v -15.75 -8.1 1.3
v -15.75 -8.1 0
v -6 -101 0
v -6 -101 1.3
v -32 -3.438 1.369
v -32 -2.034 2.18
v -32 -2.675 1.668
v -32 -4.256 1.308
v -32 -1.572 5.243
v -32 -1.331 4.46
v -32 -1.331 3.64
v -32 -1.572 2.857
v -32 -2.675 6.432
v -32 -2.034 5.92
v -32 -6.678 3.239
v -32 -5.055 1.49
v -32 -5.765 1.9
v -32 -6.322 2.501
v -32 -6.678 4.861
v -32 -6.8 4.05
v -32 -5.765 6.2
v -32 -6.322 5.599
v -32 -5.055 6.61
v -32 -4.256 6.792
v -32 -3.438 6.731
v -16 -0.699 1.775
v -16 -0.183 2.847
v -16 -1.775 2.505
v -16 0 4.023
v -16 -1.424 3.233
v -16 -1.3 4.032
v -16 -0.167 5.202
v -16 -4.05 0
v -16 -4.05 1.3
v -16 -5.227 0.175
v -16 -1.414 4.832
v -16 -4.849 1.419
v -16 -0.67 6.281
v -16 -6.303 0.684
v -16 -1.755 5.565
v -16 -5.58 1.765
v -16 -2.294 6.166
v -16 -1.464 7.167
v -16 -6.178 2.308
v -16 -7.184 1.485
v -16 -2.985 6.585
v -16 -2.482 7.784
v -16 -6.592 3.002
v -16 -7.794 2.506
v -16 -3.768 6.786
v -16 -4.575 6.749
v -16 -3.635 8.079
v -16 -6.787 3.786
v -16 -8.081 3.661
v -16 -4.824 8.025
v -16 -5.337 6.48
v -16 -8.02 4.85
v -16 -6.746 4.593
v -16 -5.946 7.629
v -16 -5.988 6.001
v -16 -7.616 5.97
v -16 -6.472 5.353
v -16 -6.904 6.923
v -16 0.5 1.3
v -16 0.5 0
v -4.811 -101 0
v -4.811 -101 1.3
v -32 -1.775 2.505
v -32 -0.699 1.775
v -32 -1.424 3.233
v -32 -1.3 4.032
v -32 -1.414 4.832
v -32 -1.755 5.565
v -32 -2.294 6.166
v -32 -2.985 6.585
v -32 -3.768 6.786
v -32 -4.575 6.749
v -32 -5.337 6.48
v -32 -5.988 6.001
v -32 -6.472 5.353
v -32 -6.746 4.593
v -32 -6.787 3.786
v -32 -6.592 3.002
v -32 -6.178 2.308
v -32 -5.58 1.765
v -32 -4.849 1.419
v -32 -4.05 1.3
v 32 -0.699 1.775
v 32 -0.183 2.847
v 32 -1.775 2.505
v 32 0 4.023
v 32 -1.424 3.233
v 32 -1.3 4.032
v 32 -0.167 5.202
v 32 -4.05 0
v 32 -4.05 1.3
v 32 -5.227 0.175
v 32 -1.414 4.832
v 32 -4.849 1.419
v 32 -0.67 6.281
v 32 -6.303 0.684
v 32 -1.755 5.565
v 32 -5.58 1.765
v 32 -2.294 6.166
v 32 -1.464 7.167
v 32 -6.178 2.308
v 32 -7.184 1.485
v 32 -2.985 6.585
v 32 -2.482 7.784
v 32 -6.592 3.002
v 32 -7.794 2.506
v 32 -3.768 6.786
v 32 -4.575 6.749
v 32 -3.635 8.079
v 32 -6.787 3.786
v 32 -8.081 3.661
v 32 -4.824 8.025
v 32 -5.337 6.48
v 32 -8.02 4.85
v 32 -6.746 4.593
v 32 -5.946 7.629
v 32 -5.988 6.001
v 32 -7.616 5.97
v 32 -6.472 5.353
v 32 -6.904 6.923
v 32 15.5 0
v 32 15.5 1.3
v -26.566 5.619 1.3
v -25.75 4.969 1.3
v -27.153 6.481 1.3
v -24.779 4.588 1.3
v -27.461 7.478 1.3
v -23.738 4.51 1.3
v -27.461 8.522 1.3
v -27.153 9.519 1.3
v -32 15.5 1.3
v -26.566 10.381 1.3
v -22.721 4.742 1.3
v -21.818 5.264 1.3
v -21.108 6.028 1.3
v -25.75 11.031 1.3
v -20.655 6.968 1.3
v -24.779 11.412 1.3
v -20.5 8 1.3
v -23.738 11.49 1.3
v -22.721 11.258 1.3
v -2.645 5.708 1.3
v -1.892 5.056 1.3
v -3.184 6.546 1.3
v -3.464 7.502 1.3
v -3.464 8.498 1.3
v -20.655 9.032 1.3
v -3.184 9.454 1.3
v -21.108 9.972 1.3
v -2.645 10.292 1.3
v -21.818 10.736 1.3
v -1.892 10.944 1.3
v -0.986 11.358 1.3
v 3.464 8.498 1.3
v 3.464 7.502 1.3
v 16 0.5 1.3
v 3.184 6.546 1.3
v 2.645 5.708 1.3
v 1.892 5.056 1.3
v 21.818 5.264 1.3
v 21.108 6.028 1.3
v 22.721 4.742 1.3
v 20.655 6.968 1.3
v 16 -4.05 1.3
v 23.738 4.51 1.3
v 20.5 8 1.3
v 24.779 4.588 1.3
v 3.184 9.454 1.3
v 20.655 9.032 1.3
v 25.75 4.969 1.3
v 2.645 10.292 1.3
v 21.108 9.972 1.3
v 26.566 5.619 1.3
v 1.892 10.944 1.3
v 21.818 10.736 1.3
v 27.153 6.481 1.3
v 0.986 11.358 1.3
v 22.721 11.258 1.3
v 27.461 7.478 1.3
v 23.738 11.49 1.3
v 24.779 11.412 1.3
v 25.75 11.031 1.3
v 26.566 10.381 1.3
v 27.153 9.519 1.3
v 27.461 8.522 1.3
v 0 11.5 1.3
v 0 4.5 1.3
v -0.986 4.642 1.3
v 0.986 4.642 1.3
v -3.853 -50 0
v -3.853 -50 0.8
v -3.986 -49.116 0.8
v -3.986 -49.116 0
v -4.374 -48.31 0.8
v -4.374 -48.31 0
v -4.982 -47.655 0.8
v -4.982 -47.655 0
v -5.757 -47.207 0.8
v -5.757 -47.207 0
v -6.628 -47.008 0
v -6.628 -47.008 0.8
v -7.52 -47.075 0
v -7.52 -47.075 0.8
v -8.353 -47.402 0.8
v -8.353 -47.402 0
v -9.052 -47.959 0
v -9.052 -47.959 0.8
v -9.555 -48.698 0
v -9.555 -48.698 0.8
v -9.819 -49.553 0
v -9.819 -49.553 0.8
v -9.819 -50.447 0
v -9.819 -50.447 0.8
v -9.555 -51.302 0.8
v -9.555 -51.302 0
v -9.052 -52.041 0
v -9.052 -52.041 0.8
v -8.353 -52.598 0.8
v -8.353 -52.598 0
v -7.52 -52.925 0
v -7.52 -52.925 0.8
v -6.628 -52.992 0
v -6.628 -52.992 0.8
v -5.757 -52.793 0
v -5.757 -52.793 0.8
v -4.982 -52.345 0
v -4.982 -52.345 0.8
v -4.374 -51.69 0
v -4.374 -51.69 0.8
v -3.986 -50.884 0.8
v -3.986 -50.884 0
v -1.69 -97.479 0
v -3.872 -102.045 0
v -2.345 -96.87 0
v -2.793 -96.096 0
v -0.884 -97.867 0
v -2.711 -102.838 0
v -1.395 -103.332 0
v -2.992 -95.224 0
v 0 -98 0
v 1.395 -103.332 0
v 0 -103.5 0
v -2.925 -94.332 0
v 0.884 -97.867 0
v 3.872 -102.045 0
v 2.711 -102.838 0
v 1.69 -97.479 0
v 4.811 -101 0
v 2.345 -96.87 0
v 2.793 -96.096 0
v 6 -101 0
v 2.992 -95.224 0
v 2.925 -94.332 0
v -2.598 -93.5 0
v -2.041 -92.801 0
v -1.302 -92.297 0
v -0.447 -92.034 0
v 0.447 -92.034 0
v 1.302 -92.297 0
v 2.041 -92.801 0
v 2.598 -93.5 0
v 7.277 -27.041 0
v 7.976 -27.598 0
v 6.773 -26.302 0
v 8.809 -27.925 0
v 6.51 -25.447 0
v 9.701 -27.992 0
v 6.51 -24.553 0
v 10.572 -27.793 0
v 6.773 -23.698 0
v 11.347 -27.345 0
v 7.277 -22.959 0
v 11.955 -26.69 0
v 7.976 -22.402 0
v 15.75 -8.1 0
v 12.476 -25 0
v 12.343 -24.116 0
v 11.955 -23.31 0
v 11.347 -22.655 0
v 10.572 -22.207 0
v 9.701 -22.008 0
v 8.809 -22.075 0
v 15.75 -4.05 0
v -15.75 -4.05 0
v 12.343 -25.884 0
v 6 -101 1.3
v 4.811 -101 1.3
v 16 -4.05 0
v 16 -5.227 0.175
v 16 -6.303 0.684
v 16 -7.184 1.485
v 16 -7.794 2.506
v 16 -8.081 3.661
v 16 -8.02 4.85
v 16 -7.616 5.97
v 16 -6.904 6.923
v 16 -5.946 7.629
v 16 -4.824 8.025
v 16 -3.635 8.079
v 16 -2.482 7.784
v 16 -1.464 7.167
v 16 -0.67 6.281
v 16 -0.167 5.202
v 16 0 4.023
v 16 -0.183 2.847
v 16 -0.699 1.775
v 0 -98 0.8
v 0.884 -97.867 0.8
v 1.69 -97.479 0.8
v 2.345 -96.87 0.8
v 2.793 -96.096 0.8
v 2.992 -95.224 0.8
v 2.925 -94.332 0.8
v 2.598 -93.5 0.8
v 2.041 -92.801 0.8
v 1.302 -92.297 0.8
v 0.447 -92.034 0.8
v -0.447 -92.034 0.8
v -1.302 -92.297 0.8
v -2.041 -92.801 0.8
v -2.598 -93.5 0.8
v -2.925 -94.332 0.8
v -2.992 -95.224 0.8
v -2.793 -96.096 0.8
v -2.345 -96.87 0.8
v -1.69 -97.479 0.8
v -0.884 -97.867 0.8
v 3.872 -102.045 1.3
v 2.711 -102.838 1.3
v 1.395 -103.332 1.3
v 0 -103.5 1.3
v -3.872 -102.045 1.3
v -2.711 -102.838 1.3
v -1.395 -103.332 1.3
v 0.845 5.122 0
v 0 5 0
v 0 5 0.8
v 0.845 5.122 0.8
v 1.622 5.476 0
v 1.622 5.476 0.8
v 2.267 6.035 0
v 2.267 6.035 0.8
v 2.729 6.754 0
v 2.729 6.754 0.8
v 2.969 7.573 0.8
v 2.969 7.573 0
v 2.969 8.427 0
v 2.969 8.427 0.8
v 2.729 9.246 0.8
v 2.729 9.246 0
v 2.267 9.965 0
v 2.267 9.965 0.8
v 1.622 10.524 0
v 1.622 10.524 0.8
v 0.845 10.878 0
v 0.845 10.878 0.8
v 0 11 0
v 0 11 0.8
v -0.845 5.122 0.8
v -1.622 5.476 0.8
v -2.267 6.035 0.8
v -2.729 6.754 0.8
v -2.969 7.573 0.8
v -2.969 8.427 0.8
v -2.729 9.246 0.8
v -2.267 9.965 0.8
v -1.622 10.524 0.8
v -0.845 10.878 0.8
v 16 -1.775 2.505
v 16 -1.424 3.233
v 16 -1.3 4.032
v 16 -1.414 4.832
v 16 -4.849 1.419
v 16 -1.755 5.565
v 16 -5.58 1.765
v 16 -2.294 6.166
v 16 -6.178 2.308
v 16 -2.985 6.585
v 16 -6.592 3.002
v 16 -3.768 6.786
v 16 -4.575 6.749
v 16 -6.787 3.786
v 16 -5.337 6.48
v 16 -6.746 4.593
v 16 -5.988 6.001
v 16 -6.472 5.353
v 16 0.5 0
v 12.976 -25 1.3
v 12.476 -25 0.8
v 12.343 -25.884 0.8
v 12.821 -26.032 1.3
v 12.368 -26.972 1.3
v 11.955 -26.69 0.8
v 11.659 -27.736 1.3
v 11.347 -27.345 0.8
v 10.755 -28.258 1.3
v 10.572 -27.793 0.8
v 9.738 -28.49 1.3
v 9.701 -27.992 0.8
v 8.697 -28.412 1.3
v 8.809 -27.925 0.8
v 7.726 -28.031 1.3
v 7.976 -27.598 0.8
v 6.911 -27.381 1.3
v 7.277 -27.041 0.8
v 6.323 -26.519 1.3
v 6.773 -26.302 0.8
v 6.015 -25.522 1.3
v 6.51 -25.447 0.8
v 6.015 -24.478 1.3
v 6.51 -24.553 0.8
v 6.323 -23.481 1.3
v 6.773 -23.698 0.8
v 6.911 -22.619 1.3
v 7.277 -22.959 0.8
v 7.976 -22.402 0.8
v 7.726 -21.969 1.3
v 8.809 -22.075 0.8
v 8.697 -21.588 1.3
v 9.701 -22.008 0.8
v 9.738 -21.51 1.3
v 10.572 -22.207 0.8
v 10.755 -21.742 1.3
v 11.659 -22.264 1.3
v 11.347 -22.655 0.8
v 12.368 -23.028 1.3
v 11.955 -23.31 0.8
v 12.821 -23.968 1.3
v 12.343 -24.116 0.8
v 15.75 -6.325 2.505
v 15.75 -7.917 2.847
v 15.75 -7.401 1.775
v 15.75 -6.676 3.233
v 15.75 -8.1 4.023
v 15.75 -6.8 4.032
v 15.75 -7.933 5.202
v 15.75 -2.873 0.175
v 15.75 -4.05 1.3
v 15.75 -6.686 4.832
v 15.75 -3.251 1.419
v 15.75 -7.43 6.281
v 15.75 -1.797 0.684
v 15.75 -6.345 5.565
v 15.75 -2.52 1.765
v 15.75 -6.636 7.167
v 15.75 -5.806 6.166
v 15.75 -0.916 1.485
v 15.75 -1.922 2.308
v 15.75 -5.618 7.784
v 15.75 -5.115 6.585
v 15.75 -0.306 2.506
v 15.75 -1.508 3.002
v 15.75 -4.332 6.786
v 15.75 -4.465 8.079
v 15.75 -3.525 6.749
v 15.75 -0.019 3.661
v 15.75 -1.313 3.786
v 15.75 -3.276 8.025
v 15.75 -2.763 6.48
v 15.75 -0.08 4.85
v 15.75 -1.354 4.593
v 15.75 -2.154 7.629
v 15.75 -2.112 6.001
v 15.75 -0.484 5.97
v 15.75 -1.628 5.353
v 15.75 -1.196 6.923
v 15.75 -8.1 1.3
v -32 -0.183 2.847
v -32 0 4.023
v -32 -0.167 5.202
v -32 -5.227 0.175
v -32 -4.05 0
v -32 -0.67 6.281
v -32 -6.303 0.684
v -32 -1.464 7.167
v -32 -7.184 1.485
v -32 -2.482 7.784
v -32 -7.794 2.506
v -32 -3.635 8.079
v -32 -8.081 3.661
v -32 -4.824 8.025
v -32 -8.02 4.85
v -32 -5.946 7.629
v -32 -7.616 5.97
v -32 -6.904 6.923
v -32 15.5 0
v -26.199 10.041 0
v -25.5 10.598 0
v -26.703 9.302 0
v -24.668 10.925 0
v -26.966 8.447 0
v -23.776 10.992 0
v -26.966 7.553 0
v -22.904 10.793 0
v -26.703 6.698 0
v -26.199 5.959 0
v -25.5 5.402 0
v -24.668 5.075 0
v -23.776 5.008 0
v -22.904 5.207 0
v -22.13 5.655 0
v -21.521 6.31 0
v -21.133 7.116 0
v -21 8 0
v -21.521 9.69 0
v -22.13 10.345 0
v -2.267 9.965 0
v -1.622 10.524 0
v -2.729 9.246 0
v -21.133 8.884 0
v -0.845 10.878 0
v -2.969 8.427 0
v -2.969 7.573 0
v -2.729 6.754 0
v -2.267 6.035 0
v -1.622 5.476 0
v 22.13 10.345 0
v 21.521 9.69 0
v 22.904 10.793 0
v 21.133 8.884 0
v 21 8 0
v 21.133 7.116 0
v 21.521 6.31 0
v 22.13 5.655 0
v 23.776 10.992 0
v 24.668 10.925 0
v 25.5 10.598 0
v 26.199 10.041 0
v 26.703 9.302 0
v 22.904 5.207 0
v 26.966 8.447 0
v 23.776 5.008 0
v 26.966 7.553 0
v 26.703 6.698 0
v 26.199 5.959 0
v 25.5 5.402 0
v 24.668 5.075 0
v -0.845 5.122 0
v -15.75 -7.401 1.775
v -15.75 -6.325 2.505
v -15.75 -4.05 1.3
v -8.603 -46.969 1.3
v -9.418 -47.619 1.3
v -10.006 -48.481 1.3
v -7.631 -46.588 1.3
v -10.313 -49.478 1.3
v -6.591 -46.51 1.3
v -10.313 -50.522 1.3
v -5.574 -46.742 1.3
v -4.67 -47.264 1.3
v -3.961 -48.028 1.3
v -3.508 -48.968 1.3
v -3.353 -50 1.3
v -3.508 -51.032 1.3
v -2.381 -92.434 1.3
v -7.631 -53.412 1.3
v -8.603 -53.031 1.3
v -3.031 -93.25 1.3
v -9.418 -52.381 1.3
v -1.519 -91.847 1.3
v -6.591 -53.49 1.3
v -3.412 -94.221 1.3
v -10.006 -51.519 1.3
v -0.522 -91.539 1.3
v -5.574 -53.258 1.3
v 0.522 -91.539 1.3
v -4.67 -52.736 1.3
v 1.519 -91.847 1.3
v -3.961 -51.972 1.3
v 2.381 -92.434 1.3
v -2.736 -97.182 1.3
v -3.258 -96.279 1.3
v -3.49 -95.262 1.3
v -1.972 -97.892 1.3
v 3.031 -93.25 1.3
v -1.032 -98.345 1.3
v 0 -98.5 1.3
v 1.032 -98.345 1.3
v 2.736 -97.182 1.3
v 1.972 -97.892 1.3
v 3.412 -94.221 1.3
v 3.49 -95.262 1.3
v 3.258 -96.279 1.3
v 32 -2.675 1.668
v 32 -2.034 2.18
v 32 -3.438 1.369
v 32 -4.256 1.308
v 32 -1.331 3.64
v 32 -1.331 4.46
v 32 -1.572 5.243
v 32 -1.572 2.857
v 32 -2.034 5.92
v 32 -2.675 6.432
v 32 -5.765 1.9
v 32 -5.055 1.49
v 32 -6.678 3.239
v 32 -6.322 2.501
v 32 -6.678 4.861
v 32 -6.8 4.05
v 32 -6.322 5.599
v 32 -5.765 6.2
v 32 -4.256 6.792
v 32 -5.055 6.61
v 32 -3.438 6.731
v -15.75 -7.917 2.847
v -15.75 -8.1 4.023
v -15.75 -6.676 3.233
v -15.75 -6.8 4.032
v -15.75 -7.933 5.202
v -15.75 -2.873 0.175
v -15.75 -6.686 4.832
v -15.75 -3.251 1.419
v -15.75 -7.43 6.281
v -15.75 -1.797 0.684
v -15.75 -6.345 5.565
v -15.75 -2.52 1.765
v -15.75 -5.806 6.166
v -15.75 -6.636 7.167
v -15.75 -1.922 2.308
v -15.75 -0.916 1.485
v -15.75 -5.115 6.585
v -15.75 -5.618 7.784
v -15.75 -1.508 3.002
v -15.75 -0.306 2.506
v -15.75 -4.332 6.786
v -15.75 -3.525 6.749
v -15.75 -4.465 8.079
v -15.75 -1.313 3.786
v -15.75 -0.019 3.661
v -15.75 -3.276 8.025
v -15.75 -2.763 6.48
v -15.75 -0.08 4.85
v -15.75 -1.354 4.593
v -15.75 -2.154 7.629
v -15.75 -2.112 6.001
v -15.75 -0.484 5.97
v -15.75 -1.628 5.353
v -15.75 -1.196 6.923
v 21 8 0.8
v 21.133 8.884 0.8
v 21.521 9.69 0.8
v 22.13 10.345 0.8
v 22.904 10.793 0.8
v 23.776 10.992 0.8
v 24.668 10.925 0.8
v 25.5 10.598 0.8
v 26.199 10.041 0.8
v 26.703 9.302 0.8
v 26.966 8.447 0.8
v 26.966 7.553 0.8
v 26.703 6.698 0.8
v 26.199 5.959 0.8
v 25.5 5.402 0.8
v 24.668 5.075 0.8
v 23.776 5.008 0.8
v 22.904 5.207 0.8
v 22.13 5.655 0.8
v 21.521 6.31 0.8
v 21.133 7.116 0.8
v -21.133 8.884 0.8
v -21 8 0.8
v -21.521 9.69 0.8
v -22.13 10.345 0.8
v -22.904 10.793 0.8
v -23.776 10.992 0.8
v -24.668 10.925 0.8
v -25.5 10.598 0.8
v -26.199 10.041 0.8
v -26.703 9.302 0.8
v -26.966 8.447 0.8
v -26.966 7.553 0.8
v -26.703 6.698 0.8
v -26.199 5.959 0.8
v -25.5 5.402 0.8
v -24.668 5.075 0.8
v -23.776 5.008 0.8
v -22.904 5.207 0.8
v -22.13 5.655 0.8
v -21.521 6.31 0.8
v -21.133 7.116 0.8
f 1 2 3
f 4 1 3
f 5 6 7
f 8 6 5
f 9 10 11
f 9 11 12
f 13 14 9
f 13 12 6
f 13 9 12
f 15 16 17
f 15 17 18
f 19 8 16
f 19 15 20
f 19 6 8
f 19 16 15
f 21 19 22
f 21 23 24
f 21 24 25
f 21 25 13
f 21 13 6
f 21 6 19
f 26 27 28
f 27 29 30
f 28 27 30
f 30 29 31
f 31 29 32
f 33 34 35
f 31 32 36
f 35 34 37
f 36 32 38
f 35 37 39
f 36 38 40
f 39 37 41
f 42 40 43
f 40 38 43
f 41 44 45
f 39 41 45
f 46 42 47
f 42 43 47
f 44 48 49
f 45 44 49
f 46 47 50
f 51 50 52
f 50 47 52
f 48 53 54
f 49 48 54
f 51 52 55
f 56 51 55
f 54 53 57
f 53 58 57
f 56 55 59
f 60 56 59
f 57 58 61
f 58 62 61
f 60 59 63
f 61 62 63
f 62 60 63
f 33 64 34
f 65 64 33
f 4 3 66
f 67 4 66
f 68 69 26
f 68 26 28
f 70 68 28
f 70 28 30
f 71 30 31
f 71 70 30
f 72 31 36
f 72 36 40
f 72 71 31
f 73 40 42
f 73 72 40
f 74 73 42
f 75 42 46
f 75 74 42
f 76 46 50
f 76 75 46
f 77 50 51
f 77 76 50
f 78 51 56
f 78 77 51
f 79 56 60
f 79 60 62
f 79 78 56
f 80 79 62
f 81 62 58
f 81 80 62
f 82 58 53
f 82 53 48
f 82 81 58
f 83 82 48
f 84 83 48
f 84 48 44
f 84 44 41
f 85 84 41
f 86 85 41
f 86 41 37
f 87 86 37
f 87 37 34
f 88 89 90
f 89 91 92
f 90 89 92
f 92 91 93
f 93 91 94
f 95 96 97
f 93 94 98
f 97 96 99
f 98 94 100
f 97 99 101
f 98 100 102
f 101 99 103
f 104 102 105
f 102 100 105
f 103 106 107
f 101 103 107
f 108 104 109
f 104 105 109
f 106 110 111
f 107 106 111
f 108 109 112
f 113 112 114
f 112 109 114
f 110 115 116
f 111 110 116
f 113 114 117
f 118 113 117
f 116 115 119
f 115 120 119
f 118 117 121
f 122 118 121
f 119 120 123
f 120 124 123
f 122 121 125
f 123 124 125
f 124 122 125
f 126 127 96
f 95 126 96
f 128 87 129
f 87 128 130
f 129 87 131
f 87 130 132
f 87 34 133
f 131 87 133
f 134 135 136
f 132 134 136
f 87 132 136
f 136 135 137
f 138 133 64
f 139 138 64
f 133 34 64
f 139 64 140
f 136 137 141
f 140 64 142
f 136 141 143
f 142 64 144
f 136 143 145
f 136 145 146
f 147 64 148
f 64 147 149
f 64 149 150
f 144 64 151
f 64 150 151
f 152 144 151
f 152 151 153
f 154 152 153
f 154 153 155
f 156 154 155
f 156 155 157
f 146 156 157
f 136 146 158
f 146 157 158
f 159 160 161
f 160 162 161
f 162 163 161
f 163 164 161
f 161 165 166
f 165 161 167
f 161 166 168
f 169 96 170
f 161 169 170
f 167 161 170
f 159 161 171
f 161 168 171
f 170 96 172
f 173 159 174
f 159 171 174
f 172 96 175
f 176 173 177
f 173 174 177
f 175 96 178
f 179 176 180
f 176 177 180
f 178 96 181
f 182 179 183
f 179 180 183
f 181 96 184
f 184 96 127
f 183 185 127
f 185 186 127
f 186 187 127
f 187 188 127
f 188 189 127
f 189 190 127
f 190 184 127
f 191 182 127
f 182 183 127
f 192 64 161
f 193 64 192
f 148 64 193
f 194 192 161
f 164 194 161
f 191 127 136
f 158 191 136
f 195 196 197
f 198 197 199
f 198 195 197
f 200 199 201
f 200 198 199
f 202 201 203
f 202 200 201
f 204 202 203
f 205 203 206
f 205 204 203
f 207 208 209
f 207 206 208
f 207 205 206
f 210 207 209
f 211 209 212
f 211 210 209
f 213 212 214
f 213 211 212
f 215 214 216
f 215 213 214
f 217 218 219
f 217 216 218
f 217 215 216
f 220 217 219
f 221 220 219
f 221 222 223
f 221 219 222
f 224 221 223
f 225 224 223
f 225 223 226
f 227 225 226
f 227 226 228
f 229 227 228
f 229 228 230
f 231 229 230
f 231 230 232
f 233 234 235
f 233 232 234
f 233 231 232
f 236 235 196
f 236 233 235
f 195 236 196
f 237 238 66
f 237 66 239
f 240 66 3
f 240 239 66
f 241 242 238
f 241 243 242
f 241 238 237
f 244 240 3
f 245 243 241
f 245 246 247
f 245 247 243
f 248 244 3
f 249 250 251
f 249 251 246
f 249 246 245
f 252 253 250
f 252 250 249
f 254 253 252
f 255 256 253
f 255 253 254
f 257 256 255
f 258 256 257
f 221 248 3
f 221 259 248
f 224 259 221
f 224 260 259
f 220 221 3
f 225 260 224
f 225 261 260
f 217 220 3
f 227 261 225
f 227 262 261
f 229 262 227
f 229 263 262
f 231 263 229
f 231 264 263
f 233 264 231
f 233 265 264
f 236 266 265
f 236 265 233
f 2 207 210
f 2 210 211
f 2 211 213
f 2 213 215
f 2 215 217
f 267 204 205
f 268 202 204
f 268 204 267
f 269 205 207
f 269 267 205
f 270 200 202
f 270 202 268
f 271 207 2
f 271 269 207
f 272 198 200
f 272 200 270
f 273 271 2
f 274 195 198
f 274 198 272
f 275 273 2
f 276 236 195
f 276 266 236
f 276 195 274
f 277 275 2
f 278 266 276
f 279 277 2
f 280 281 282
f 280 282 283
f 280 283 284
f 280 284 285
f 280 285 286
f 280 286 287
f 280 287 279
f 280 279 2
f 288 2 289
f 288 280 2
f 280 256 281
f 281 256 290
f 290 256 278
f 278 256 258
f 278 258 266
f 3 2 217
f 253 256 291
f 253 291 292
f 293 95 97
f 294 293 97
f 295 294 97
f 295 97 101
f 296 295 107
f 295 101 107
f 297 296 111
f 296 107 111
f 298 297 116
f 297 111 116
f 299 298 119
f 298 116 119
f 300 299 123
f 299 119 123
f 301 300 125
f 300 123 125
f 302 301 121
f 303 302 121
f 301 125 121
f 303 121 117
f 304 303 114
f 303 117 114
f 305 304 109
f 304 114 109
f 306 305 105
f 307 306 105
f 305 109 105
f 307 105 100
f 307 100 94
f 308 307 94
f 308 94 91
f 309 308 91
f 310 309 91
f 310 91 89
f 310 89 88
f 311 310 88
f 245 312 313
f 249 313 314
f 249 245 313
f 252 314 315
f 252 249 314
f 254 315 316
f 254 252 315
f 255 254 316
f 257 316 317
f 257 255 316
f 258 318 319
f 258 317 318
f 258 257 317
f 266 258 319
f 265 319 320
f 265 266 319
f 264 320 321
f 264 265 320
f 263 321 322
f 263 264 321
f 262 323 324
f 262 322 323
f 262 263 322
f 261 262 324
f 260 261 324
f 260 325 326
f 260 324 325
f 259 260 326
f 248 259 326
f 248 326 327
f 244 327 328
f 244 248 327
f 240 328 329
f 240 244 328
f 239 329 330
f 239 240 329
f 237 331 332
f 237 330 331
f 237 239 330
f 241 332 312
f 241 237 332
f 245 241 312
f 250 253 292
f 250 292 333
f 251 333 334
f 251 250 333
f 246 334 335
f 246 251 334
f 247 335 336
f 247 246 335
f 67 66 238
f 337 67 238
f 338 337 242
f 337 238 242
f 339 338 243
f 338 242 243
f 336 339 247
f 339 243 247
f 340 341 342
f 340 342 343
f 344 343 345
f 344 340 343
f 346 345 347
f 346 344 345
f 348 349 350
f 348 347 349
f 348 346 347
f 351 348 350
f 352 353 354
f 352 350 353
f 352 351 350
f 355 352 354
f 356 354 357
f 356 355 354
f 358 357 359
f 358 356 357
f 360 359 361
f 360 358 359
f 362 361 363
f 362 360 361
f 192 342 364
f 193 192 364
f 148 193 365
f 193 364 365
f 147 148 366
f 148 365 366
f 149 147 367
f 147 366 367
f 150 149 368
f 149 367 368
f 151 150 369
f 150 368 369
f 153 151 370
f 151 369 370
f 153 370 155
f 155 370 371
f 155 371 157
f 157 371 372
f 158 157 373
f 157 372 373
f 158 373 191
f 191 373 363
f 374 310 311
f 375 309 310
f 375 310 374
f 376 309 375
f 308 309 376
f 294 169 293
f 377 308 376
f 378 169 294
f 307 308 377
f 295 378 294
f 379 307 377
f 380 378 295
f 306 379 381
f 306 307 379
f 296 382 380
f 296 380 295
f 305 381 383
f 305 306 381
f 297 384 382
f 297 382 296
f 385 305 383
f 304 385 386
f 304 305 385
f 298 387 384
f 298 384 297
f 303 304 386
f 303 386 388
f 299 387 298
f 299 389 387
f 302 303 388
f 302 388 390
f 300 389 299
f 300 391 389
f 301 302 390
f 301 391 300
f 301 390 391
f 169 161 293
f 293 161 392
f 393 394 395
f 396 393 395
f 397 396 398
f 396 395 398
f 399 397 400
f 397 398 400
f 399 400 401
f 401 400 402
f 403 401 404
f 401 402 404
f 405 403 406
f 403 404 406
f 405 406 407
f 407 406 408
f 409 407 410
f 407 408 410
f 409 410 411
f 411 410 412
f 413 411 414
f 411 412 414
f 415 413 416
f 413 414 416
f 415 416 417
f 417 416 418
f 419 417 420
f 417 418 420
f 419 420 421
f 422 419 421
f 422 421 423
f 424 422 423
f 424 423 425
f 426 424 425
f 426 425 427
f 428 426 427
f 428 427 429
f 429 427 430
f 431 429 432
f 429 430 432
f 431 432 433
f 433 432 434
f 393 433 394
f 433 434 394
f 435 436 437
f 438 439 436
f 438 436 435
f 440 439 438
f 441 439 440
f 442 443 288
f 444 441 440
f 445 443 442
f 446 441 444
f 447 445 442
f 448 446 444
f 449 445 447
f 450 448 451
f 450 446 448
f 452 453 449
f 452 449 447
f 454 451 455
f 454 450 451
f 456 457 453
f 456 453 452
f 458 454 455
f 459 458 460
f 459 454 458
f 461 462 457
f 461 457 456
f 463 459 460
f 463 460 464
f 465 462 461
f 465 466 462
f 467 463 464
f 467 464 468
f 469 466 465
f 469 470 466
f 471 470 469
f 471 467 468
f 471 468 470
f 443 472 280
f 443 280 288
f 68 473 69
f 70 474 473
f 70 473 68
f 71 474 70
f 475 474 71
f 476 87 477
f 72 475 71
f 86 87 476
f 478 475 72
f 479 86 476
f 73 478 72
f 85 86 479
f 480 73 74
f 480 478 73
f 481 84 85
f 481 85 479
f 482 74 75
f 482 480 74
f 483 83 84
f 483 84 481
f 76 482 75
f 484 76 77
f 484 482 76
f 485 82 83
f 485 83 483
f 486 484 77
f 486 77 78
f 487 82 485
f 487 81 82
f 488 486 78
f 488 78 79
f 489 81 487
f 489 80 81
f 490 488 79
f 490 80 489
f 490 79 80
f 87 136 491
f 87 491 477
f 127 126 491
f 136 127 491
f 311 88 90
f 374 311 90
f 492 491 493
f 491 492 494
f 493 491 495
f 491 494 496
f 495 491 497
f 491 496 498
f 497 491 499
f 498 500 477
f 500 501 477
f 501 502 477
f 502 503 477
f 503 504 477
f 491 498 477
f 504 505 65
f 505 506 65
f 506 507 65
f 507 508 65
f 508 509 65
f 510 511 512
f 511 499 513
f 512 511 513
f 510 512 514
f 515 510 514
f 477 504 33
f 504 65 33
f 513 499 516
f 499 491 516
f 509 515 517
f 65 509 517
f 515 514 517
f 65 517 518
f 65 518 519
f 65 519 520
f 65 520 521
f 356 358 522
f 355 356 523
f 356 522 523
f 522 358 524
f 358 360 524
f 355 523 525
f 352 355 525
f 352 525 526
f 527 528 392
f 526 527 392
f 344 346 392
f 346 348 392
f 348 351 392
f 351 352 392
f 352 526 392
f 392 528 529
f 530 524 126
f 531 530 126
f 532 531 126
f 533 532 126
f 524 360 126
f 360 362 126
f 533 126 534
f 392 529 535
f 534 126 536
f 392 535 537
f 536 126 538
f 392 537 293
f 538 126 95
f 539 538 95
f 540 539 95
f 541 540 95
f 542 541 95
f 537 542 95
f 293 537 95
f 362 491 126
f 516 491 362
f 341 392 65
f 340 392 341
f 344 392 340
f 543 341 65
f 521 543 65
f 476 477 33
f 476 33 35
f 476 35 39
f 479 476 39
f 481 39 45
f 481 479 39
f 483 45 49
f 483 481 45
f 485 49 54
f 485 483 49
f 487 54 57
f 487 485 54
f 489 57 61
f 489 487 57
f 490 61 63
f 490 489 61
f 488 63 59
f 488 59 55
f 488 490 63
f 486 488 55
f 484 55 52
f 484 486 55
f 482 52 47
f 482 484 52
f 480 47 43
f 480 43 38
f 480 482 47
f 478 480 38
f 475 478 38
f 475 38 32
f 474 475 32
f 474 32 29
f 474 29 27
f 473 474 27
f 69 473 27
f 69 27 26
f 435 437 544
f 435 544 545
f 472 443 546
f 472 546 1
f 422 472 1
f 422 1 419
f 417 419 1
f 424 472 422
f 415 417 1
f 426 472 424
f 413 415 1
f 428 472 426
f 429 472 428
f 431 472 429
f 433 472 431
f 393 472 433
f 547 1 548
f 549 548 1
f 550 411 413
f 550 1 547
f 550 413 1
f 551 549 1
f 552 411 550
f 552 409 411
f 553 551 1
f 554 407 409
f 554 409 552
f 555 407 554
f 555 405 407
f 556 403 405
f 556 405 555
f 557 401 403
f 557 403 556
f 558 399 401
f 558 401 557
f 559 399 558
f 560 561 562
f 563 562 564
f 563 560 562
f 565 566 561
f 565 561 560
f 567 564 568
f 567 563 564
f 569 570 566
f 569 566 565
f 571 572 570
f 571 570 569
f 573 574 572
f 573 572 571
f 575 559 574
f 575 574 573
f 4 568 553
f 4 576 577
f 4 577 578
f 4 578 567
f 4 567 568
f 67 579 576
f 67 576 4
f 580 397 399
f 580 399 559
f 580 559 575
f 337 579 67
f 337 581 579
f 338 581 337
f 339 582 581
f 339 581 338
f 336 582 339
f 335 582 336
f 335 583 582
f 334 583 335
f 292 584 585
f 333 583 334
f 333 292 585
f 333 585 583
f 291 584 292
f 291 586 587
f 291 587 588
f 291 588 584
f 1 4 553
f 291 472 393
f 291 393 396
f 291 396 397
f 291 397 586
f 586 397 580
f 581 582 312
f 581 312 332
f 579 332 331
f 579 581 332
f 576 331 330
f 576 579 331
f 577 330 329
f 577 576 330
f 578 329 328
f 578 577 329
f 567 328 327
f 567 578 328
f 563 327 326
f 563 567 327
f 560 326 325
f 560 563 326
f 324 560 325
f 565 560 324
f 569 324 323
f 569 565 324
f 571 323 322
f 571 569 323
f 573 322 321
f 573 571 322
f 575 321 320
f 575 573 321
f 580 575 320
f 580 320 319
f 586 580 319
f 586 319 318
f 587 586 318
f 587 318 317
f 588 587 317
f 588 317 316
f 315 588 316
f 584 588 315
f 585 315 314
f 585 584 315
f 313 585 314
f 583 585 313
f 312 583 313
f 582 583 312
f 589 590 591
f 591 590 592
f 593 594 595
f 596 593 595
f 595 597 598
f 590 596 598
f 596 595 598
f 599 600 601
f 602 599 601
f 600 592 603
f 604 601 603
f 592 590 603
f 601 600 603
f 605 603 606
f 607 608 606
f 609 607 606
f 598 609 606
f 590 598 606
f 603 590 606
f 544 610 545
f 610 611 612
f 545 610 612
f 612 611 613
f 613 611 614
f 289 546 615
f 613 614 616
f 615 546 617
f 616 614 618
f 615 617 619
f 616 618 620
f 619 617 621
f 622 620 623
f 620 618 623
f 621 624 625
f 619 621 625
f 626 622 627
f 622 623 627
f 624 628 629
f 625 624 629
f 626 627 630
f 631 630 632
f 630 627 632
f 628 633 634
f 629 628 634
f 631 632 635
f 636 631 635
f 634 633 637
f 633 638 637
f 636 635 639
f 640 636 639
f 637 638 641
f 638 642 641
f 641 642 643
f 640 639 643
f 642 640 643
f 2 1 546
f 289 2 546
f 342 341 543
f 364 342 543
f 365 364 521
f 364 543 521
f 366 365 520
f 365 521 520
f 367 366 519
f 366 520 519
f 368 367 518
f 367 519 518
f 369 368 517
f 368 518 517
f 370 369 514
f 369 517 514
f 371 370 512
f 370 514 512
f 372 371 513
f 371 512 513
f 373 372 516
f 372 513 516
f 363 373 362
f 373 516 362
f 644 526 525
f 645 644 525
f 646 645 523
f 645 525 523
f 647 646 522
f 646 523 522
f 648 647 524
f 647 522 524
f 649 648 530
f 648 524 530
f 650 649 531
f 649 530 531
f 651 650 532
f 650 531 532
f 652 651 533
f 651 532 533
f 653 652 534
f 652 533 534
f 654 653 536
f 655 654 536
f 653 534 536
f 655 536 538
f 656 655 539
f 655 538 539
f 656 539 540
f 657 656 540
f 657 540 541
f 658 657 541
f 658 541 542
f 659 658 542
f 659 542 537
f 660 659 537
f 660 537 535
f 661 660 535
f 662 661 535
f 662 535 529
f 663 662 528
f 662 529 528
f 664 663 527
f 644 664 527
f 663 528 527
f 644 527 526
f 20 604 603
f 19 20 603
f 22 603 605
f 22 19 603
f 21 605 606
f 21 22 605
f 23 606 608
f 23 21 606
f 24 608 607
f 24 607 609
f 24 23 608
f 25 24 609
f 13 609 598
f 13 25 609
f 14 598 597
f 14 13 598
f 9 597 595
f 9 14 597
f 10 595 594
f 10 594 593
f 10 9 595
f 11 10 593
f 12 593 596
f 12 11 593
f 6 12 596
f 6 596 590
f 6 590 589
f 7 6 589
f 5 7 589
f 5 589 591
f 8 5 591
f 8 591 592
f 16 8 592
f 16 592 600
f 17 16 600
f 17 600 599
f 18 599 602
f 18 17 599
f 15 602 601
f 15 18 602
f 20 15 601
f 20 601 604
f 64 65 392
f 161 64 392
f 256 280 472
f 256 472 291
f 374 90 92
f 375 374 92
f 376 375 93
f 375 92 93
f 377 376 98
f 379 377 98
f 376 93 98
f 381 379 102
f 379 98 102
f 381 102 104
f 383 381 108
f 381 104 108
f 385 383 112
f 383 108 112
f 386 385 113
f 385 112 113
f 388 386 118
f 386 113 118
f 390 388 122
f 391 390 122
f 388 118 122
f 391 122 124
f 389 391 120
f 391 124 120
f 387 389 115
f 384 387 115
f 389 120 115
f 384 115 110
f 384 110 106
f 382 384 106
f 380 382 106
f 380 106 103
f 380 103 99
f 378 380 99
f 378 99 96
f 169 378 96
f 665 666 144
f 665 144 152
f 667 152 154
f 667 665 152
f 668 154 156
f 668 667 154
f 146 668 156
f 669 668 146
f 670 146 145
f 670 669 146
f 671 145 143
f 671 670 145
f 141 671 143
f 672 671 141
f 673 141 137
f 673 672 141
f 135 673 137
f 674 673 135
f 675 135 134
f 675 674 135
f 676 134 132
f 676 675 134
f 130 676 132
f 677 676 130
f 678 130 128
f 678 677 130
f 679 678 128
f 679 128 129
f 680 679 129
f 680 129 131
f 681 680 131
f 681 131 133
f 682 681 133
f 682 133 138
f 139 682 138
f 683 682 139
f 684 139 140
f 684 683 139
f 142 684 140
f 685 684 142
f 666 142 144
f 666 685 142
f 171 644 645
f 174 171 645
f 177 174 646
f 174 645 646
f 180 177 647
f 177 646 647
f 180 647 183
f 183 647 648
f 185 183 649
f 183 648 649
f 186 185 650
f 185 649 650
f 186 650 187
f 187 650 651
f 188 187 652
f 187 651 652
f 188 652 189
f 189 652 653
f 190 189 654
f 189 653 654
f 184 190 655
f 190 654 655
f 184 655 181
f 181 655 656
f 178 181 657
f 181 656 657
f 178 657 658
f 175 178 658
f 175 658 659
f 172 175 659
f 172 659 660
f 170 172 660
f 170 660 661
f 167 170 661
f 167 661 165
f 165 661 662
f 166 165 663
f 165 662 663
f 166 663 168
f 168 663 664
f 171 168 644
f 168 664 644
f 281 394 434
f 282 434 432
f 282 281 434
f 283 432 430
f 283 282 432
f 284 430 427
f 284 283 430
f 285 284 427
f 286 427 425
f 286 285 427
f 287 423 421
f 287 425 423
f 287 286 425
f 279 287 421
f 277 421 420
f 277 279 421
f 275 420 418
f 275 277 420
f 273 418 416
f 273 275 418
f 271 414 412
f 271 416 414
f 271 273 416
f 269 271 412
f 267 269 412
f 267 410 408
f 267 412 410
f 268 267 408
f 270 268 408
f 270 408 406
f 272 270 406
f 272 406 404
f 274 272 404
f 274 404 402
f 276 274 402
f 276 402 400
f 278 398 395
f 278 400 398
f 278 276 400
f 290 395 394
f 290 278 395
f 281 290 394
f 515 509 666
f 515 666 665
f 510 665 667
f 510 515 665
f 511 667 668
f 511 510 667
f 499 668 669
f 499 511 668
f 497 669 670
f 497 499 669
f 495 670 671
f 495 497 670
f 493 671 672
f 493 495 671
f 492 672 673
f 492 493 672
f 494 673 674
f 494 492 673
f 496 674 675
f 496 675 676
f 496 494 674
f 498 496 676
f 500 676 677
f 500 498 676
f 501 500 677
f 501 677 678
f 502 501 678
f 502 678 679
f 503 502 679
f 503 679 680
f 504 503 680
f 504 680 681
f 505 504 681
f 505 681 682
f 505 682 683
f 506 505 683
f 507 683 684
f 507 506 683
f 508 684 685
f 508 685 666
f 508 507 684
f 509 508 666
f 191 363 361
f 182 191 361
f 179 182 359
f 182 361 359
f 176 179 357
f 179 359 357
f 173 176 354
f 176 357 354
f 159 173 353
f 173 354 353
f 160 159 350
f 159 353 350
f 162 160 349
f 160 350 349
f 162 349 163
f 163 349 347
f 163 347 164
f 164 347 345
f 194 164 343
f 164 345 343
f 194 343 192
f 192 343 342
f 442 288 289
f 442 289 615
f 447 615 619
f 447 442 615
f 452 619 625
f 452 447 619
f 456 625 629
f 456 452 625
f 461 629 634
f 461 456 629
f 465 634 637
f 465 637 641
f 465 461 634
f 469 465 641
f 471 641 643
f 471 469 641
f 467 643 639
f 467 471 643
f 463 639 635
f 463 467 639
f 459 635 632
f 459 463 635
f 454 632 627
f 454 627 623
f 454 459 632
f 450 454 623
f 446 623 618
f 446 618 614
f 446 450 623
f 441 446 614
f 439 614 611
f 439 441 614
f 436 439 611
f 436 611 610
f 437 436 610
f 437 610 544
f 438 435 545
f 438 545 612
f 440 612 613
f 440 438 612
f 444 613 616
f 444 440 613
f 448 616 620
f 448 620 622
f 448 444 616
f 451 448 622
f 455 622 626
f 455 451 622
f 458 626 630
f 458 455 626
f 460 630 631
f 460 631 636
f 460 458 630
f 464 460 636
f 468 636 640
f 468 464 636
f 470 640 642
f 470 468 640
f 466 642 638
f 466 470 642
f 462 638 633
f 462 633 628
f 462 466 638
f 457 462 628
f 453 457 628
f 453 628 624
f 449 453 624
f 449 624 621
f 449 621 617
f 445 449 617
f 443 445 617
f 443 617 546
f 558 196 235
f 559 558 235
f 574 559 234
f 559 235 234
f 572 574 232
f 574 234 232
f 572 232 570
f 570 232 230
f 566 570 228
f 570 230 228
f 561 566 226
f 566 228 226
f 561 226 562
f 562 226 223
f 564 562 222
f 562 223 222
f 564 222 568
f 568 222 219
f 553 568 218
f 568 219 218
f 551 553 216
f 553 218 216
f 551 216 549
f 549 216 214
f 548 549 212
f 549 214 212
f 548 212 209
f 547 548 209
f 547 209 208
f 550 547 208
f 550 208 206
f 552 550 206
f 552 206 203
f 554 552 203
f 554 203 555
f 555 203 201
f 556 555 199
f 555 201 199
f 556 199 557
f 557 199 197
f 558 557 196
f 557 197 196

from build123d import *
from build123d import SkipClean  # not in build123d's __all__

# Parameters (mm, degrees)
F0_R          = 3
F1_DEPTH      = 1.3
F2_DEPTH      = 1.3
F5_DEPTH      = 1.301
F7_DEPTH      = 15.75
F7_DEPTH_BACK = 15.75
F9_DEPTH      = 16
F11_R         = 2.75
F12_DEPTH     = 64
F13_SIZE      = 0.5
F13_2_SIZE    = 0.5


with BuildPart() as f1:
    # F0 (on Top) → F1 (new body)
    with BuildSketch(Plane.XY):
        with BuildLine():
            Line((0, 15.5), (-32, 15.5))
            Line((-32, 15.5), (-32, 0))
            Line((-32, 0), (-16, 0))
            Line((-16, 0), (-16, 0.5))
            Line((-16, 0.5), (0, 0.5))
            Line((0, 0.5), (0, 5))
            ThreePointArc((0, 5), (-3, 8), (0, 11))
            Line((0, 11), (0, 15.5))
        make_face()
        with Locations((-24, 8)):
            Circle(F0_R, mode=Mode.SUBTRACT)
    extrude(amount=F1_DEPTH)

    # F3: F1 across face


with BuildPart() as f2:
    # F0 (on Top) → F2 (new body)
    with BuildSketch(Plane.XY):
        with BuildLine():
            Line((0, -92), (0, -8.1))
            Line((0, -8.1), (-15.75, -8.1))
            Line((-15.75, -8.1), (-6, -101))
            Line((-6, -101), (-4.8112012446, -101))
            ThreePointArc((-4.8112012446, -101), (-2.7109803308, -102.8376972935), (0, -103.5))
            Line((0, -103.5), (0, -98))
            ThreePointArc((0, -98), (-3, -95), (0, -92))
        make_face()
        with Locations((-6.8525296017, -50)):
            Circle(F0_R, mode=Mode.SUBTRACT)
        with Locations((-6.8525296017, -50)):
            Circle(F0_R)
    extrude(amount=F2_DEPTH)

    # F4: F2 across face


with BuildPart() as f1_1:
    add(f1.part, clean=False)
    with SkipClean():  # cleaning this boolean's faces spoils the solid; the shape is the same uncleaned
        add(f1.part.mirror(Plane(origin=(0, -50.05, 0.65), x_dir=(0, 1, 0), z_dir=(1, 0, 0))), clean=False)

    # F8 (on face) → F9 (join, through all)
    with BuildSketch(Plane(origin=(-32, 0, 0), x_dir=(0, -1, 0), z_dir=(-1, 0, 0))):
        with BuildLine():
            Line((0, 0), (4.05, 0))
            ThreePointArc((4.05, 0), (5.9458344619, 7.6288701699), (0.6994096777, 1.7749078058))
            Line((0.6994096777, 1.7749078058), (1.7749078058, 2.5051843126))
            ThreePointArc((1.7749078058, 2.5051843126), (5.337295005, 6.480097029), (4.05, 1.3))
            Line((4.05, 1.3), (0, 1.3))
            Line((0, 1.3), (0, 0))
        make_face()
    extrude(amount=-F9_DEPTH)

    # F10: F1 across plane


with BuildPart() as f2_1:
    add(f2.part, clean=False)
    with SkipClean():  # cleaning this boolean's faces spoils the solid; the shape is the same uncleaned
        add(f2.part.mirror(Plane(origin=(0, -50.05, 0.65), x_dir=(0, 1, 0), z_dir=(1, 0, 0))), clean=False)

    # F0 (on Top) → F5 (cut, through all)
    with BuildSketch(Plane.XY):
        with Locations((9.4763186222, -25)):
            Circle(F0_R)
        with Locations((-6.8525296017, -50)):
            Circle(F0_R)
    extrude(amount=F5_DEPTH, mode=Mode.SUBTRACT)

    # F6 (on Right) → F7 (join, two sides)
    with BuildSketch(Plane.YZ) as f7_sk:
        with BuildLine():
            Line((-8.1, 0), (-4.05, 0))
            ThreePointArc((-4.05, 0), (-2.1541655381, 7.6288701699), (-7.4005903223, 1.7749078058))
            Line((-7.4005903223, 1.7749078058), (-6.3250921942, 2.5051843126))
            ThreePointArc((-6.3250921942, 2.5051843126), (-2.762704995, 6.480097029), (-4.05, 1.3))
            Line((-4.05, 1.3), (-8.1, 1.3))
            Line((-8.1, 1.3), (-8.1, 0))
        make_face()
    extrude(amount=F7_DEPTH)
    extrude(f7_sk.sketch, amount=-F7_DEPTH_BACK)

    # F13#2
    f13_2_edges = [f2_1.edges().sort_by_distance(p)[0] for p in [
        (6.476319, -25, 1.3),
        (-9.85253, -50, 1.3),
        (-3, -95, 1.3),
        (3, -95, 1.3),
    ]]
    chamfer(f13_2_edges, length=F13_2_SIZE)


with BuildPart() as f1_2:
    add(f1_1.part, clean=False)
    add(f1_1.part.mirror(Plane.YZ), clean=False)

    # F13
    f13_edges = [f1_2.edges().sort_by_distance(p)[0] for p in [
        (27, 8, 1.3),
        (-3, 8, 1.3),
        (3, 8, 1.3),
        (-27, 8, 1.3),
    ]]
    chamfer(f13_edges, length=F13_SIZE)


with BuildPart() as f12:
    # F11 (on face) → F12 (new body, through all)
    with BuildSketch(Plane(origin=(-32, 0, 0), x_dir=(0, -1, 0), z_dir=(-1, 0, 0))):
        with Locations((4.05, 4.05)):
            Circle(F11_R)
    extrude(amount=-F12_DEPTH)


solid = Compound([f2_1.part, f1_2.part, f12.part])
